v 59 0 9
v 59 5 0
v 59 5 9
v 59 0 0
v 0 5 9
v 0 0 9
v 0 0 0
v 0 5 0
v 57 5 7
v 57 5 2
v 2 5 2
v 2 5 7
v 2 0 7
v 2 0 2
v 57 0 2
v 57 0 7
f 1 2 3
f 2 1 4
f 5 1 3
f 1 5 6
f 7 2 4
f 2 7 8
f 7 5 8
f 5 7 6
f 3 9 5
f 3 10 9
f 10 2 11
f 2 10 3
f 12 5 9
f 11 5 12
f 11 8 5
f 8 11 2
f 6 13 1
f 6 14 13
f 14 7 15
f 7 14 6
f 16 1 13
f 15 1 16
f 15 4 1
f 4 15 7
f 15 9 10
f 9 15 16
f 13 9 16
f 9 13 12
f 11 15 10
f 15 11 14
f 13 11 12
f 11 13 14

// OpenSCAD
$fa=4; // default minimum facet angle is now 0.5
$fs=0.05; // default minimum facet size is now 0.05 mm


// difference() {
//   rad1 = .825;
//   rad2 = 1;
//   rad3 = 1.125;
//   height = 5;
//   cube([(rad1 + rad2 + rad3) * 2 + 12, rad3 * 2 + 9, height]);
//   translate([rad1 + 3, rad1 + 6, -.1]) cylinder(h = height + 0.2, r=rad1);
//   translate([(rad1 * 2) + rad2 + 6, rad1 + 6, -.1]) cylinder(h = height + 0.2, r=rad2);
//   translate([((rad1 + rad2) * 2) + rad3 + 9, rad1 + 6, -.1]) cylinder(h = height + 0.2, r=rad3);
//   // translate([.5, 1, height - 1.99]) linear_extrude(2) text(text = str(rad1), size = 4);
//   // translate([rad1 * 2 + 4, 1, height - 1.99]) linear_extrude(2) text(text = str(rad2), size = 4);
//   // translate([(rad1 + rad2) * 2 + 7.5, 1, height - 1.99]) linear_extrude(2) text(text = str(rad3), size = 4);
// }

difference() {
  cube([59, 5, 9]);
  translate([2, 0, 2]) cube([55, 5, 5]);
}
